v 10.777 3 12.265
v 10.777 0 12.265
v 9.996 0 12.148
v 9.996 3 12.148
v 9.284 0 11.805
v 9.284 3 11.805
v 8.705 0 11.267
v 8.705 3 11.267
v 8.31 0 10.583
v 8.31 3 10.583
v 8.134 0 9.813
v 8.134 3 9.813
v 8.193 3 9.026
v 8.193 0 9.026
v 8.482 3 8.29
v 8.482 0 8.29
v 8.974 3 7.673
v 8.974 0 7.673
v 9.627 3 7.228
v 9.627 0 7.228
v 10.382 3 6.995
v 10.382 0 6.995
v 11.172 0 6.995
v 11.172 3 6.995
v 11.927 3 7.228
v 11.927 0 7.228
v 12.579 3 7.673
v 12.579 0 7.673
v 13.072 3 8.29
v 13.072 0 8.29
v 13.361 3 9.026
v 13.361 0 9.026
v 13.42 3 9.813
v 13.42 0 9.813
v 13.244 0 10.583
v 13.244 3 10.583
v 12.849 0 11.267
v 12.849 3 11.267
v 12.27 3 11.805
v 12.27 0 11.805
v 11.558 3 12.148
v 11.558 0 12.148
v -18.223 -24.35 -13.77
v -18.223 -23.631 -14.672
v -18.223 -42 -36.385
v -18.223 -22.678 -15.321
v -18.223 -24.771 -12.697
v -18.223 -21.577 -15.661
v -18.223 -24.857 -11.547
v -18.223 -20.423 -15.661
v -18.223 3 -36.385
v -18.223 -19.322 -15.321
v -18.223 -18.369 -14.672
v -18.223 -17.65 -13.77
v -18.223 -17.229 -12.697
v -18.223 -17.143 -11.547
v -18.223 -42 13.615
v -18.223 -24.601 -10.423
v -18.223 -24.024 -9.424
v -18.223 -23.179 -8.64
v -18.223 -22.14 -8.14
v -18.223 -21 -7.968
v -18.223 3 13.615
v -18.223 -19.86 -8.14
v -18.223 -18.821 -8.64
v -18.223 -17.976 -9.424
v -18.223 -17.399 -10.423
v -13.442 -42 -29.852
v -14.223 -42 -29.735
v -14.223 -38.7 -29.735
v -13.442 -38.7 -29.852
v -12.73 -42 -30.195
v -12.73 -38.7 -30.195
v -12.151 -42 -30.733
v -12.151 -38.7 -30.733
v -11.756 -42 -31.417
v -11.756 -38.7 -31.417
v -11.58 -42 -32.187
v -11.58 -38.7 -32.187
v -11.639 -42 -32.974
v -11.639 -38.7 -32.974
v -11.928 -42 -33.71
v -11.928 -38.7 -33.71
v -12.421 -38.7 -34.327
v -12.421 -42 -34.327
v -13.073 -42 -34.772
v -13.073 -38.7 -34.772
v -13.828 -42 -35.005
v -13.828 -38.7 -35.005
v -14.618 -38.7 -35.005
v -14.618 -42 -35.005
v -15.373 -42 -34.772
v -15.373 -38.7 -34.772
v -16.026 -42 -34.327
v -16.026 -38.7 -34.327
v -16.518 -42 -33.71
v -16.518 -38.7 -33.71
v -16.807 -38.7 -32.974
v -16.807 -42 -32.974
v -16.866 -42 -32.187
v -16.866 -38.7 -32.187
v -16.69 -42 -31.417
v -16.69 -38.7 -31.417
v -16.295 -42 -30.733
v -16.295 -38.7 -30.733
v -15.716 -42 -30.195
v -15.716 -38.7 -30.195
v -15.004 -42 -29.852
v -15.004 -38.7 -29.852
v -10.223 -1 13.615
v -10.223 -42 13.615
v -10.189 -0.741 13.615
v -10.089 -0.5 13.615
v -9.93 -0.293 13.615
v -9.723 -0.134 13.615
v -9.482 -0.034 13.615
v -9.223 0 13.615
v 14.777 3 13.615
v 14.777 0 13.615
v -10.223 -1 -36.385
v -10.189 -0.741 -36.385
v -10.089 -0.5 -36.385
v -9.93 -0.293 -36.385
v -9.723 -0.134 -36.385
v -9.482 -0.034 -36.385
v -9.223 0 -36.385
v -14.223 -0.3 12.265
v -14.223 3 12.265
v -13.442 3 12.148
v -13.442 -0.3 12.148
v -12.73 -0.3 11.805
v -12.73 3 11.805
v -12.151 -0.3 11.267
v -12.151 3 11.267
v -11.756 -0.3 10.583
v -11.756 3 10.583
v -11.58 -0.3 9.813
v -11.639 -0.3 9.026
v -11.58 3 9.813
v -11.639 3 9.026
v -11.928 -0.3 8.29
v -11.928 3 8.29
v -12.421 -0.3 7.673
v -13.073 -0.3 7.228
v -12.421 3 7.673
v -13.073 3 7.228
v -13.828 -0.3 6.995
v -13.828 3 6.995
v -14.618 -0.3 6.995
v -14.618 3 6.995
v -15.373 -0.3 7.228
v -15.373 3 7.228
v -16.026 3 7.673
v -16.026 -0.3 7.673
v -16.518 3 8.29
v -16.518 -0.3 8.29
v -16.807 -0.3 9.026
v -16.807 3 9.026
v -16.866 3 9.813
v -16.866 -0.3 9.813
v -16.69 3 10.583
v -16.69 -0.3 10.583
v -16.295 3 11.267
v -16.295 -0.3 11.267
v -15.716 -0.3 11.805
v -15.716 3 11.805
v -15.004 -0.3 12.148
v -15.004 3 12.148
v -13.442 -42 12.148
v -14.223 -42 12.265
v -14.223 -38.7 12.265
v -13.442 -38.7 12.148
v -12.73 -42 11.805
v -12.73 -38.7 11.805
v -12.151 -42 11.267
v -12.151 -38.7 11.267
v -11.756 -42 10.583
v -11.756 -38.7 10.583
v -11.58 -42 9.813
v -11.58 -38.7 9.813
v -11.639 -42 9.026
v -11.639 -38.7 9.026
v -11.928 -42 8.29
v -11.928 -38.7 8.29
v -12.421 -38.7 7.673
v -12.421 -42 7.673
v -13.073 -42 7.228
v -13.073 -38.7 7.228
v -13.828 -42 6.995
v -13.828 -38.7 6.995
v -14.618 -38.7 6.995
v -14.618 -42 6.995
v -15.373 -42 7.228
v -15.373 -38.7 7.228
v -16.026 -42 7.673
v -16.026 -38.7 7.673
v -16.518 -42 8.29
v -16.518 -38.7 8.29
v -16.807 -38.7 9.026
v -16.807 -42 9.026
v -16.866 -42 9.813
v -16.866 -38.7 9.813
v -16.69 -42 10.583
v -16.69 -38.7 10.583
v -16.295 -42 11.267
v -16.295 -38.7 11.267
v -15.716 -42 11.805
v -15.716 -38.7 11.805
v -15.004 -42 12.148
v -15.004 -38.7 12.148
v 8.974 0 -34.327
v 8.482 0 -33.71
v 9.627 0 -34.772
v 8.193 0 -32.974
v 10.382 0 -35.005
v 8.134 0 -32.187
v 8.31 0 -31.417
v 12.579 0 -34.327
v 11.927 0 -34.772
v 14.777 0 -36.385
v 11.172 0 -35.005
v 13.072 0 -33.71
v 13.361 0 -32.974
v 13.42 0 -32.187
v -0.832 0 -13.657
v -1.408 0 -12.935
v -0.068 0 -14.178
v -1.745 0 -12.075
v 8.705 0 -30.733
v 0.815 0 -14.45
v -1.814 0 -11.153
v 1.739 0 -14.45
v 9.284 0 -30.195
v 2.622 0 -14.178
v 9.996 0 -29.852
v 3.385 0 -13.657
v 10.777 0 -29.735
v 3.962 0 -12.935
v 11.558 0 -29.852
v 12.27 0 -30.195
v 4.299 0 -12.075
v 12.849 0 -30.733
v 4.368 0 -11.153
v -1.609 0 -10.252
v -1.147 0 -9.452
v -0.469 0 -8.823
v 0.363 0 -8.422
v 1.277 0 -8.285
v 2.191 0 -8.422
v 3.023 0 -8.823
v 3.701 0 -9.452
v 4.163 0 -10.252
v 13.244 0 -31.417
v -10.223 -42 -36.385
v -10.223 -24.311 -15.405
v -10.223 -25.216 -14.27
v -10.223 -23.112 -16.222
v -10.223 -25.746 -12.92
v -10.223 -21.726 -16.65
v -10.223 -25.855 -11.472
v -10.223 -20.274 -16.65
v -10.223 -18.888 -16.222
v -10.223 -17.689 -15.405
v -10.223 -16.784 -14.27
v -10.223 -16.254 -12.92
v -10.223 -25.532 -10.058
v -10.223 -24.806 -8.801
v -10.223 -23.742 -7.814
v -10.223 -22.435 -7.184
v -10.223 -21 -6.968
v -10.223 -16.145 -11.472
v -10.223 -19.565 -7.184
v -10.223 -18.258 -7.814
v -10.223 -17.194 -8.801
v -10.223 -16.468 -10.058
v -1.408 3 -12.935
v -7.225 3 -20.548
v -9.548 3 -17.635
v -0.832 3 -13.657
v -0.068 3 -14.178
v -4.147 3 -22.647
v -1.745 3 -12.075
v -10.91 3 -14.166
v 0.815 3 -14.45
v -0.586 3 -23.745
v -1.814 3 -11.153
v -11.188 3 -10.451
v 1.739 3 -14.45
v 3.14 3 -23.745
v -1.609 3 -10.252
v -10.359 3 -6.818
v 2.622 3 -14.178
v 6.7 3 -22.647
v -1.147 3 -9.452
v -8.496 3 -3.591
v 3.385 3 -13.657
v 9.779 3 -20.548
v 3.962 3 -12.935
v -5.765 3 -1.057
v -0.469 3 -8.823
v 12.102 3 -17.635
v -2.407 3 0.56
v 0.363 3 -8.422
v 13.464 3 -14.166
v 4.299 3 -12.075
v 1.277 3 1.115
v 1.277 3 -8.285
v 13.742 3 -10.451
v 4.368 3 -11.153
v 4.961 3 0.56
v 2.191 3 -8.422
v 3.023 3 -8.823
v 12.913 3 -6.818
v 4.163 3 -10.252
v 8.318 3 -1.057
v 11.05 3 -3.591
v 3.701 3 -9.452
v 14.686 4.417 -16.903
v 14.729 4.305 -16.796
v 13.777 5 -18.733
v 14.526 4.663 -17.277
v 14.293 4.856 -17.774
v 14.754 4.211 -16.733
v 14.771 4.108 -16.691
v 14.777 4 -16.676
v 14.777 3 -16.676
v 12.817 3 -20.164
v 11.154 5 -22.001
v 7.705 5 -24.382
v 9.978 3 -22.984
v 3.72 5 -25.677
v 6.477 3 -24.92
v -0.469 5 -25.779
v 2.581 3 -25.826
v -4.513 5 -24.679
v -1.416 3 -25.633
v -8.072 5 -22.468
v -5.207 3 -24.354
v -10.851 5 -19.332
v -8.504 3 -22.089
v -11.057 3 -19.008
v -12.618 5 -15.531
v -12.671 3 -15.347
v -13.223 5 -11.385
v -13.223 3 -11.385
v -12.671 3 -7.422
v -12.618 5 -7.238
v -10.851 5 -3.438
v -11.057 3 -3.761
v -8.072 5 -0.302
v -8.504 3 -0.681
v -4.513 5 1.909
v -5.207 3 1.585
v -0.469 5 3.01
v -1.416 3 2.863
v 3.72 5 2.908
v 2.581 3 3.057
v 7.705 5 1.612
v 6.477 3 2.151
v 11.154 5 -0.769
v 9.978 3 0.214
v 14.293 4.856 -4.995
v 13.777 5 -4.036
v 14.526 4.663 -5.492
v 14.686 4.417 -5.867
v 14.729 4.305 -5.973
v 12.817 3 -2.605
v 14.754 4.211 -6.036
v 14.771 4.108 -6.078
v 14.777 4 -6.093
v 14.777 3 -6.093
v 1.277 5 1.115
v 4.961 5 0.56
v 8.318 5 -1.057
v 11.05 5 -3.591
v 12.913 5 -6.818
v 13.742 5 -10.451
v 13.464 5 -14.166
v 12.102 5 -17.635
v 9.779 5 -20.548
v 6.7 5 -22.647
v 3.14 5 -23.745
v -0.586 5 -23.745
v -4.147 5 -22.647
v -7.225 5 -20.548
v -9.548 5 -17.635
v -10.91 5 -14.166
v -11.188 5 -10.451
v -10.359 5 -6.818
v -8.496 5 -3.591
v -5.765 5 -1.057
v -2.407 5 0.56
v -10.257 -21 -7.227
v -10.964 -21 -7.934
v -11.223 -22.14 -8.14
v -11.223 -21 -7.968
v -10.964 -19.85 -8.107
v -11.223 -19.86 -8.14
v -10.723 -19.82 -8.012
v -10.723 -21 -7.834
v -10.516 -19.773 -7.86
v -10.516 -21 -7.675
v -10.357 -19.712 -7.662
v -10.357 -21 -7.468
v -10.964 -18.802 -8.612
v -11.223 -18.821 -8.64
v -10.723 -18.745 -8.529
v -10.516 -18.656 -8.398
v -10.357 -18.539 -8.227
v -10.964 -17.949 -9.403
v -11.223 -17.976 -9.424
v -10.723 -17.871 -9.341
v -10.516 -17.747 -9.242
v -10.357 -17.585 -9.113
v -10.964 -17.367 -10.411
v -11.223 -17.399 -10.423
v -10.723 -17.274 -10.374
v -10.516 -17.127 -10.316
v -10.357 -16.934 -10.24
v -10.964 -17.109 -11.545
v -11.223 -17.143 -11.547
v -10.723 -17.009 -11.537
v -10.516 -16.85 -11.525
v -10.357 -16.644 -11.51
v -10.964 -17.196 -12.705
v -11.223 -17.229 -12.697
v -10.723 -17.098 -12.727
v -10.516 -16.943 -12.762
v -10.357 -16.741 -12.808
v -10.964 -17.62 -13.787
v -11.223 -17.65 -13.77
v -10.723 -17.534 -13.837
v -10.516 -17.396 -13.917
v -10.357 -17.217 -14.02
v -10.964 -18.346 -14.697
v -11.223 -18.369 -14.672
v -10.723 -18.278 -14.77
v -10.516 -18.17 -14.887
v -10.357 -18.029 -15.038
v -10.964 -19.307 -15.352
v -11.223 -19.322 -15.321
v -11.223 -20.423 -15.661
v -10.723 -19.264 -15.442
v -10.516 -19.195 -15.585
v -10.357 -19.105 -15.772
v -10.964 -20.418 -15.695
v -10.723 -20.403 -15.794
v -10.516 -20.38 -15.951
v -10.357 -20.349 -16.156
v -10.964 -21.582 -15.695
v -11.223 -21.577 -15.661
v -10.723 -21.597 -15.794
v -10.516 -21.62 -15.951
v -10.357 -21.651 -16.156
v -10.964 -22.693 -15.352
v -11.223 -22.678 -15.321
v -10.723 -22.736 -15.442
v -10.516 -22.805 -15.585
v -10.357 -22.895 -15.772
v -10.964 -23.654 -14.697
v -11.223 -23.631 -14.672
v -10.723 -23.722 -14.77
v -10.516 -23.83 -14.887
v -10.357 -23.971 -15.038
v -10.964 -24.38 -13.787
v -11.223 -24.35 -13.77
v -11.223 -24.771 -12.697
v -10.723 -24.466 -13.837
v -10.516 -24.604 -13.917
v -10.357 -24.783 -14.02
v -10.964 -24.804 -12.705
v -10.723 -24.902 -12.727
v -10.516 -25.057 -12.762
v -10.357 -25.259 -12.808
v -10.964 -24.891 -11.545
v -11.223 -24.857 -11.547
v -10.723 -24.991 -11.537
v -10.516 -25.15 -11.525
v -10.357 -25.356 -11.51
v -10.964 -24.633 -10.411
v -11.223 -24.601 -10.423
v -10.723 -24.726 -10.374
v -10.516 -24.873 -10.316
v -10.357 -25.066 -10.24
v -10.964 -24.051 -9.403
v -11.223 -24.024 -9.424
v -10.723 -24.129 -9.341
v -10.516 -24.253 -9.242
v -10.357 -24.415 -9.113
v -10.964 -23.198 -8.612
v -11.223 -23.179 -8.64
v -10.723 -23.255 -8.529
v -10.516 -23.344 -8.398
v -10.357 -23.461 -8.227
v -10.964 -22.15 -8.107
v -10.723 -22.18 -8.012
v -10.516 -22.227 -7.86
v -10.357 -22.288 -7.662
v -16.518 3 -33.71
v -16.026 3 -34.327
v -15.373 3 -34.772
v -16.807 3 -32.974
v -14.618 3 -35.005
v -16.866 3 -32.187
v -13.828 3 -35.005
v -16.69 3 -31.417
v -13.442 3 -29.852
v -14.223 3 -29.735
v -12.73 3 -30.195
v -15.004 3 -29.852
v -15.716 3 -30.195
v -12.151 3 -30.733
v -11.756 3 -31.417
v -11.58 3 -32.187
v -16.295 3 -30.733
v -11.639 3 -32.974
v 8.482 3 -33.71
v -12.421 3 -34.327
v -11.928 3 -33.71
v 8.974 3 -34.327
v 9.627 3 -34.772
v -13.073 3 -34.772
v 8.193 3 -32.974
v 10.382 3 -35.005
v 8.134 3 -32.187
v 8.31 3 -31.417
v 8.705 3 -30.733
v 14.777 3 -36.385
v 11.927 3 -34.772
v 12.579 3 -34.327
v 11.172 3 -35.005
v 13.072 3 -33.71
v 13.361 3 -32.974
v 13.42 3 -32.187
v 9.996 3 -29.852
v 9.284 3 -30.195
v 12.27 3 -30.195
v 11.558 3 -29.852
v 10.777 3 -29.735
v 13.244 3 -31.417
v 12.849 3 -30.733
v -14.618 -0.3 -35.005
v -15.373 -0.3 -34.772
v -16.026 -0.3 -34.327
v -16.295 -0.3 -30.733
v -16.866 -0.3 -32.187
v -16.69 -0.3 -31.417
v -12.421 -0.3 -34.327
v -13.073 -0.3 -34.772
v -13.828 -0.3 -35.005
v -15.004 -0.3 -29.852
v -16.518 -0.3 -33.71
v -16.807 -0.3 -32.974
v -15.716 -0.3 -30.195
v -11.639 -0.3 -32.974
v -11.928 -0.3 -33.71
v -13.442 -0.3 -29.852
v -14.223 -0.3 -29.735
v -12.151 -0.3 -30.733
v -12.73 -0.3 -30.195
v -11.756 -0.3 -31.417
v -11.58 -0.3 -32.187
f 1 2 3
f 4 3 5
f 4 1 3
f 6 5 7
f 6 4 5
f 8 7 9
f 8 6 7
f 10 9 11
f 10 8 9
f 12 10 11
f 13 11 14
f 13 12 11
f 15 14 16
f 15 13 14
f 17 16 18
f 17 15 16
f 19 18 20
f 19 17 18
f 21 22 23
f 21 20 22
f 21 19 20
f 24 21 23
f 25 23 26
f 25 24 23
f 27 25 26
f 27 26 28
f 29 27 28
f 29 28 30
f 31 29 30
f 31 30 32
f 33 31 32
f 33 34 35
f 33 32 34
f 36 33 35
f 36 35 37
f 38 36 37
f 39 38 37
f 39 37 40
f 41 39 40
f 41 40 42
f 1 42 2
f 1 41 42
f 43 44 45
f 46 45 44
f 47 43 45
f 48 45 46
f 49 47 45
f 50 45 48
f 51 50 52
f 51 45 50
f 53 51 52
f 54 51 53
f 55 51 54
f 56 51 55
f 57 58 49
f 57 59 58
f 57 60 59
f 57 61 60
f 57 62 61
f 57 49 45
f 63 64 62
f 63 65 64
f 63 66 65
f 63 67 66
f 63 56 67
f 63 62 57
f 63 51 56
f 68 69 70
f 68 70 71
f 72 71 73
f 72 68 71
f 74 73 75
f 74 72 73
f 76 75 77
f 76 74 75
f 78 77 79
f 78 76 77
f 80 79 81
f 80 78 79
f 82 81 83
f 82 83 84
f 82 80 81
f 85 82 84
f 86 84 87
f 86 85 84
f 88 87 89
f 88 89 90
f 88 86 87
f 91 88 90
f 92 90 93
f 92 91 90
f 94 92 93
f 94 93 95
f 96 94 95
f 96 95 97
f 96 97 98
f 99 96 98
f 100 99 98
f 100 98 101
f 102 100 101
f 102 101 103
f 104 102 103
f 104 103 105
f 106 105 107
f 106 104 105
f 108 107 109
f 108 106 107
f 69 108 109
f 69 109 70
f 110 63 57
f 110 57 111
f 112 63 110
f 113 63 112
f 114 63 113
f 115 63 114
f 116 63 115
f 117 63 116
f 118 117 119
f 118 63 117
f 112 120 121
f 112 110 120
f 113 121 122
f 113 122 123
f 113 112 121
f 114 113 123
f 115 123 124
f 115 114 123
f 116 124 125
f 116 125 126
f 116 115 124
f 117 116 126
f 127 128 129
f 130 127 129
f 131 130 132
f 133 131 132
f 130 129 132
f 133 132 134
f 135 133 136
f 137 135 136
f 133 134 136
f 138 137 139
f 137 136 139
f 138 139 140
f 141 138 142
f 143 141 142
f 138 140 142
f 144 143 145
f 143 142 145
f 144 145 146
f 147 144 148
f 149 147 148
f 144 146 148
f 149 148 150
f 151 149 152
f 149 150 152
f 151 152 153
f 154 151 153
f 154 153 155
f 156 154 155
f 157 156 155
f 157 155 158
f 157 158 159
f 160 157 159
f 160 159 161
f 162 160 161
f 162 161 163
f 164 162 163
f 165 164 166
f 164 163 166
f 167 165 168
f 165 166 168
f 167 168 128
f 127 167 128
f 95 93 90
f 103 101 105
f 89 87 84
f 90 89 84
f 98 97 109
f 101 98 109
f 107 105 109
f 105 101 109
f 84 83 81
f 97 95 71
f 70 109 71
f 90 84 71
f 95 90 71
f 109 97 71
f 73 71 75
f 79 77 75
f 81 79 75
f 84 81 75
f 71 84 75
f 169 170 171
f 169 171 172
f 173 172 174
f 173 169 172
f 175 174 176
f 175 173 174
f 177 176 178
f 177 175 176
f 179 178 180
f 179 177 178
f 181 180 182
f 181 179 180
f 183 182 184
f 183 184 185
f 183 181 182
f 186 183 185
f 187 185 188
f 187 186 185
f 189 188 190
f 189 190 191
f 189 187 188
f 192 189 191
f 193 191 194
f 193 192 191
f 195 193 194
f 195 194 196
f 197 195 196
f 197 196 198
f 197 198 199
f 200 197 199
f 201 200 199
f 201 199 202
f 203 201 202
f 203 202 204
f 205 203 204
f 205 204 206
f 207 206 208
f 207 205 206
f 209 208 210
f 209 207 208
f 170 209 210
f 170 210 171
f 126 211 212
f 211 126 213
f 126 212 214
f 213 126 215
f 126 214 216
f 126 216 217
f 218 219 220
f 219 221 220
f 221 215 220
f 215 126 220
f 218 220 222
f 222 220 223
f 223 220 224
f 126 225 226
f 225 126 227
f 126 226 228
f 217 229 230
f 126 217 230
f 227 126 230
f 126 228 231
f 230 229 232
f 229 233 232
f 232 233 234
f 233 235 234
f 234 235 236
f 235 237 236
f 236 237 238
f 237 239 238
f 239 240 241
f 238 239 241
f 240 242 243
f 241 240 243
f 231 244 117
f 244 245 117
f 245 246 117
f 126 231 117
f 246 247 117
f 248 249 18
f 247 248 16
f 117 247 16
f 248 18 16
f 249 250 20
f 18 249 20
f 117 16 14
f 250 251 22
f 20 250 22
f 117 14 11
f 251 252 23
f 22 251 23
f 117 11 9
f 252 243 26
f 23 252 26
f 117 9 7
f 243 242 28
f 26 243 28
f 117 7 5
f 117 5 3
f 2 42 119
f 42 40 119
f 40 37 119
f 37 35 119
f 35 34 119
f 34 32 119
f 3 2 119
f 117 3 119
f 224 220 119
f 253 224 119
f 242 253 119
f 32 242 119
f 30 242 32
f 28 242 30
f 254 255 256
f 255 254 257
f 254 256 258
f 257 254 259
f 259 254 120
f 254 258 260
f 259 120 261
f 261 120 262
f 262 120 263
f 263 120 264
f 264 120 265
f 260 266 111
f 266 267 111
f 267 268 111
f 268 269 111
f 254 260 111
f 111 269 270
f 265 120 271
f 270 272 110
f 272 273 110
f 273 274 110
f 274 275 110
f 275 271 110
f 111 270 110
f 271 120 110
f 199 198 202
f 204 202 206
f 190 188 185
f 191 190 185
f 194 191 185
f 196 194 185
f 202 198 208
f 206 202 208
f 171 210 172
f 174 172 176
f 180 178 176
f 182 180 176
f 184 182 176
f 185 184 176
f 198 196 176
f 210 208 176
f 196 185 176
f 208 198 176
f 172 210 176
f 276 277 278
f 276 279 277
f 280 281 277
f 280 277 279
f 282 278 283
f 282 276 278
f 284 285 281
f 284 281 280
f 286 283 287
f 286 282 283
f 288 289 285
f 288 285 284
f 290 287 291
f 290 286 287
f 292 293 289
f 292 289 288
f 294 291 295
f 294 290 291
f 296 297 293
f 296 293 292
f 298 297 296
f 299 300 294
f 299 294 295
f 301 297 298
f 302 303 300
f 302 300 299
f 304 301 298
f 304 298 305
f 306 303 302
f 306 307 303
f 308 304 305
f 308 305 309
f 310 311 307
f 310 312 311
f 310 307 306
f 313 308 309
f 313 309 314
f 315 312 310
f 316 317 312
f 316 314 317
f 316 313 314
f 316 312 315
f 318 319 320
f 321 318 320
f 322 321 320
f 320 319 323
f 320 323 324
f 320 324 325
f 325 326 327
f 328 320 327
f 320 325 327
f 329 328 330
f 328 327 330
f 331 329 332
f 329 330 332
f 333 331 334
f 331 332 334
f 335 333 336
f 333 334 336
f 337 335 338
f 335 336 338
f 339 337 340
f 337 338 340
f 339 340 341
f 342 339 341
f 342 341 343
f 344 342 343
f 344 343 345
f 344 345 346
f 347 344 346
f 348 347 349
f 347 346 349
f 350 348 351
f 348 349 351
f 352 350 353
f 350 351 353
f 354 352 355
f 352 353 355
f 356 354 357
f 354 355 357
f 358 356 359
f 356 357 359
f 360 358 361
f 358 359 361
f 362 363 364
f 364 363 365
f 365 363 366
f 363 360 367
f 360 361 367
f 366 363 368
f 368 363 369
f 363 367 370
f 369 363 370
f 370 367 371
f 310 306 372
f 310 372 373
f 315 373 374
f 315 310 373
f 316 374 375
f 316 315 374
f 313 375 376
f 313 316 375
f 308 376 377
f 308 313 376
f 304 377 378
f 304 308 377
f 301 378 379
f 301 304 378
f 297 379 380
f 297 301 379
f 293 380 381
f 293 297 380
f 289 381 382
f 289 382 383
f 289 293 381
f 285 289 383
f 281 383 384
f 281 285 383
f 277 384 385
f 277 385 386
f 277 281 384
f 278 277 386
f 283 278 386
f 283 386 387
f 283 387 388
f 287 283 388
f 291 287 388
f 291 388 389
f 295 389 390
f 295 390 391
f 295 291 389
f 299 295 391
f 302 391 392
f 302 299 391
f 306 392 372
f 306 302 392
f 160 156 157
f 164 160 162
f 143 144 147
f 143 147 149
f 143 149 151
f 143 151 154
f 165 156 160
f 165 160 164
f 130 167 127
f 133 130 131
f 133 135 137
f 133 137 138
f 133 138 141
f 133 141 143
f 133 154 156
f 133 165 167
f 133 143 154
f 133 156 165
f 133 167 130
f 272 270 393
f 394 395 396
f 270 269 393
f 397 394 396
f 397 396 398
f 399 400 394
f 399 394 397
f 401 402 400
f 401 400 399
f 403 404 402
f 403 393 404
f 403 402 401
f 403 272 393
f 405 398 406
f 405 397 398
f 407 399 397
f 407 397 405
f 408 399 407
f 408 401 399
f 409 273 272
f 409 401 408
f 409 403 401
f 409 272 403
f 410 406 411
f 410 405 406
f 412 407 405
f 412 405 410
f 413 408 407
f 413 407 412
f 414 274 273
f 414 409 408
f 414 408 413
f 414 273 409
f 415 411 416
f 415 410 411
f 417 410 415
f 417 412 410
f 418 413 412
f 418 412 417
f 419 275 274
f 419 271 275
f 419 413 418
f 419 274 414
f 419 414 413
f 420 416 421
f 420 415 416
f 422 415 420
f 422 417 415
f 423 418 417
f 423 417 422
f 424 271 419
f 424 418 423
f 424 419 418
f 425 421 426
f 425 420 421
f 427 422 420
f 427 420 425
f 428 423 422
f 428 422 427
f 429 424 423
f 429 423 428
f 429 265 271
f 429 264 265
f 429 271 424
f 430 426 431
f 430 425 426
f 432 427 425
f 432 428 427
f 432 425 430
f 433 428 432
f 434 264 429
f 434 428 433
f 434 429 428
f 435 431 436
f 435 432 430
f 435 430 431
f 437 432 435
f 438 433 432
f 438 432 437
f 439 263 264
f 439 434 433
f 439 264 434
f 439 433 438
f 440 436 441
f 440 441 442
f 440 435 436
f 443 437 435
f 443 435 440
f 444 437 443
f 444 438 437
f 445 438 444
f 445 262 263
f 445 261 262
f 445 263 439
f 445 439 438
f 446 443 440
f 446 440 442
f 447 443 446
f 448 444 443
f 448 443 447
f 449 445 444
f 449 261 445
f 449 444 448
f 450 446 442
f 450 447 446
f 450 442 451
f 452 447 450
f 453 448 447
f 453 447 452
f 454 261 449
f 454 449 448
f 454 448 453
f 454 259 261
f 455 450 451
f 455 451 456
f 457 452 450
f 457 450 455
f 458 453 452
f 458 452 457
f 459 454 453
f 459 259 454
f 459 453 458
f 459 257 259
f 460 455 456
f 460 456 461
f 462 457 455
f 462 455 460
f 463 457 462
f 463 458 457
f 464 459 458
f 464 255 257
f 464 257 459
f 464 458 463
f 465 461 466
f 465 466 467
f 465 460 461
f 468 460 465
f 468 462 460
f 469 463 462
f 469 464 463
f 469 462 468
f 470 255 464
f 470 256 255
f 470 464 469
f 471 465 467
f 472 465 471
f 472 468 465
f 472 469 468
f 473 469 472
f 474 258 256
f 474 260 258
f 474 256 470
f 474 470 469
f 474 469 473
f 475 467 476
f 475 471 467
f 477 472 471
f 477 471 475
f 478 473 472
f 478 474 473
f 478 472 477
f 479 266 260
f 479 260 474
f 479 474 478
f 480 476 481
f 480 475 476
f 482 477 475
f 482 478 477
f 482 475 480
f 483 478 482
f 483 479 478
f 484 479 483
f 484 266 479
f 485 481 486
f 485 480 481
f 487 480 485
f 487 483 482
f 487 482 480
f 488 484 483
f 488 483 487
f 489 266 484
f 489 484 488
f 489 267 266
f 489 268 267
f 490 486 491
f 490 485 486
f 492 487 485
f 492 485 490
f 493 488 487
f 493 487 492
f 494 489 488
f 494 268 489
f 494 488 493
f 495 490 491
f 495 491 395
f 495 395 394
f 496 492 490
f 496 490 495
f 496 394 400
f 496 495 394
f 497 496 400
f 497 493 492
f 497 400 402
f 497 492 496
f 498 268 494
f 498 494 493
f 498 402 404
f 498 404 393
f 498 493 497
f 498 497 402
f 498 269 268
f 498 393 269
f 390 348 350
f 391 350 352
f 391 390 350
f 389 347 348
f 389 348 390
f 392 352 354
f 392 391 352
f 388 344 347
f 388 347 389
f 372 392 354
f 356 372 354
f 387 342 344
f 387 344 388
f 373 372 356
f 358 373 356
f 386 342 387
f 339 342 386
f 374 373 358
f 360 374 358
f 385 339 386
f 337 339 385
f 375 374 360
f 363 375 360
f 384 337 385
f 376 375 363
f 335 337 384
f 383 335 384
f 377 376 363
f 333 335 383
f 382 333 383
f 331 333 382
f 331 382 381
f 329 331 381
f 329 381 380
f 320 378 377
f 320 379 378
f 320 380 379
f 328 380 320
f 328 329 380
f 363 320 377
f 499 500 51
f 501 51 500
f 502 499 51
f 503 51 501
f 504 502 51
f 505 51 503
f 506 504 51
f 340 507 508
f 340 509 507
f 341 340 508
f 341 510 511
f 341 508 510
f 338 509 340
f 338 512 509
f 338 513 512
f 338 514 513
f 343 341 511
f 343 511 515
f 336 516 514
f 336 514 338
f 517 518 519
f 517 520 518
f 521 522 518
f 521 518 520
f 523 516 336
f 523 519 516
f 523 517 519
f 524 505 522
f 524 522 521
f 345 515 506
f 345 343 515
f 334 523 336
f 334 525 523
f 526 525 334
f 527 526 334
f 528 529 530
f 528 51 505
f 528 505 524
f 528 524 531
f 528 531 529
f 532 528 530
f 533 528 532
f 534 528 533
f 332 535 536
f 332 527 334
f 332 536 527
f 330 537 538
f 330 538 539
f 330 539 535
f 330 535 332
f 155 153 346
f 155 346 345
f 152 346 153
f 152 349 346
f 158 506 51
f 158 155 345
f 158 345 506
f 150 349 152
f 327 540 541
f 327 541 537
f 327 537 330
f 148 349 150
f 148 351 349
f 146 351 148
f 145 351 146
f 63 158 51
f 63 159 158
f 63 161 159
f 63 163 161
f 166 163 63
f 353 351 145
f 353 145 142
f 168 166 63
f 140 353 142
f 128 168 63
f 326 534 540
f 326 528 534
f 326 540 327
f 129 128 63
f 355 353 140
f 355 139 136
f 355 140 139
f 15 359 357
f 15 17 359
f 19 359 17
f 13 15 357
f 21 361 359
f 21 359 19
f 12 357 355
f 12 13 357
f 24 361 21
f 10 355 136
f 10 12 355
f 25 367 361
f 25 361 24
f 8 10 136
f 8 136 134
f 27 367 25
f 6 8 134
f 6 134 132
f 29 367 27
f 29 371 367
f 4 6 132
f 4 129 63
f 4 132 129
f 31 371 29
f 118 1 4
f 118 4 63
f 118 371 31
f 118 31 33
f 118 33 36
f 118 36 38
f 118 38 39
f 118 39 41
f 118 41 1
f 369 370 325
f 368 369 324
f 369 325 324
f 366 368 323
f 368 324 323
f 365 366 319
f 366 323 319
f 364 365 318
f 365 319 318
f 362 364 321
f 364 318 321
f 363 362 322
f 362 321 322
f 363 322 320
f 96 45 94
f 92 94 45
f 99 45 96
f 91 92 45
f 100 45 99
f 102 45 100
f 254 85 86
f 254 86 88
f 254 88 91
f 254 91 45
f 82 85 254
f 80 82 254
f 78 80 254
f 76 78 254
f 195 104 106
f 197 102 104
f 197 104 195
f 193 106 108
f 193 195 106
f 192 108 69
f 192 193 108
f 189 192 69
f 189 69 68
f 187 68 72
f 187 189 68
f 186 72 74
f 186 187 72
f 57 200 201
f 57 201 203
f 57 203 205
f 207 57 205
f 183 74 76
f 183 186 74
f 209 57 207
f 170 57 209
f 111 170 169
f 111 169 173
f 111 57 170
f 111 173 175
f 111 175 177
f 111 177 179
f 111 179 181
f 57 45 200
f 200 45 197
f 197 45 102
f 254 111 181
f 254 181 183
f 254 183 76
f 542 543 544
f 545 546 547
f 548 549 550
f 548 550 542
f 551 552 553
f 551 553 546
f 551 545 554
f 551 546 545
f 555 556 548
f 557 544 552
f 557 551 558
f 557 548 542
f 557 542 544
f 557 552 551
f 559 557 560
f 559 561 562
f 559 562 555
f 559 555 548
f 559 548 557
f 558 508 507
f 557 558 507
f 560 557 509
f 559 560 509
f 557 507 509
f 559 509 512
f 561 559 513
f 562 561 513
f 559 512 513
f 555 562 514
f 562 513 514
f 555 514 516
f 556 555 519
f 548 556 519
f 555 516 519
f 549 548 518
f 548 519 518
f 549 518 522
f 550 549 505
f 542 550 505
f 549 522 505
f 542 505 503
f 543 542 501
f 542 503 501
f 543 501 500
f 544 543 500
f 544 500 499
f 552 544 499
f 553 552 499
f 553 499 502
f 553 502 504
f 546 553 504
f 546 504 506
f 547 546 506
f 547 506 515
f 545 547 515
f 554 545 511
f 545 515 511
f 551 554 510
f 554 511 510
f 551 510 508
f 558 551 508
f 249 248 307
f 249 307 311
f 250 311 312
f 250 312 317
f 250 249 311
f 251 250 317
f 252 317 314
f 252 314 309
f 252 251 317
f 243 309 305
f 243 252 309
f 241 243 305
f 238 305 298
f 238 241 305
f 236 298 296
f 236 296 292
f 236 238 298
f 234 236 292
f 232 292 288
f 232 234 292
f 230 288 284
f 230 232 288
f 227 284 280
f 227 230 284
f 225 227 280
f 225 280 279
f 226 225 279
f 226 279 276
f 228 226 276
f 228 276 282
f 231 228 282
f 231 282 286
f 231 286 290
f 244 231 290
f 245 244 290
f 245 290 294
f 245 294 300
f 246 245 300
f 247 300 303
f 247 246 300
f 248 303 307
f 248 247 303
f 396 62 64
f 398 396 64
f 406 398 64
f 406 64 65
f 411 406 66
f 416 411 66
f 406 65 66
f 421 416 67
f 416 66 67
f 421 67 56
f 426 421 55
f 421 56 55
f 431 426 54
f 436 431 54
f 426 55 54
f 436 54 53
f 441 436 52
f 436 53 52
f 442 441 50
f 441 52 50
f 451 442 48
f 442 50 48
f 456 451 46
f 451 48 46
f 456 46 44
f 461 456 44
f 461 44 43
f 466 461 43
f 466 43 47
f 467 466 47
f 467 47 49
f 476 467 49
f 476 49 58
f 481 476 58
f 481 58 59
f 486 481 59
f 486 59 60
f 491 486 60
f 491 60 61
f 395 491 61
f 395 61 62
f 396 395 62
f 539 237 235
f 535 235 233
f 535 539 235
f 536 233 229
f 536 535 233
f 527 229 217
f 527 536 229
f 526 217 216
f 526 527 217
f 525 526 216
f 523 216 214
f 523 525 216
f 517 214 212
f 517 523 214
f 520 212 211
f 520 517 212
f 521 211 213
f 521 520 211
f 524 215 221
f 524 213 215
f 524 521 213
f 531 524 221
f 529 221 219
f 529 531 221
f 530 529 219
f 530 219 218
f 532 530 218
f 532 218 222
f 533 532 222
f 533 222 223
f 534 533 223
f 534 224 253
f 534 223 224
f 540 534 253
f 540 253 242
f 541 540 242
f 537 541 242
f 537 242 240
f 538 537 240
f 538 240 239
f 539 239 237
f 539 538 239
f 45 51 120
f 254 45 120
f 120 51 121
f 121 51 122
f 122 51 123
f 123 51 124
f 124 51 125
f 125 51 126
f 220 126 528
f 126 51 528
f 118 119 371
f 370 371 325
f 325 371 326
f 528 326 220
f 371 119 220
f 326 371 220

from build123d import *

# Parameters (mm, degrees)
SKETCH1_W           = 25
SKETCH1_H           = 50
SKETCH1_R           = 3.1
BOSS_EXTRUDE1_DEPTH = 3
SKETCH2_W           = 50
SKETCH2_H           = 3
BOSS_EXTRUDE2_DEPTH = 8
SKETCH3_W           = 8
SKETCH3_H           = 50
BOSS_EXTRUDE3_DEPTH = 42
SKETCH4_R           = 2.65
CUT_EXTRUDE1_DEPTH  = 3.3
SKETCH5_R           = 3.868246804
CUT_EXTRUDE2_DEPTH  = 9
FILLET2_R           = 1
SKETCH6_R           = 12.5
BOSS_EXTRUDE4_DEPTH = 2
FILLET3_R           = 1
FILLET4_R           = 1


with BuildPart() as part:
    # Sketch1 → Boss-Extrude1 (new body)
    with BuildSketch(Plane(origin=(0, 0, 0), x_dir=(1, 0, 0), z_dir=(0, 1, 0))):
        with Locations((2.276951673, 11.384758364)):
            Rectangle(SKETCH1_W, SKETCH1_H)
        with Locations(Location((1.276951673, 11.384758364, 0), (0, 0, 270))):
            Circle(SKETCH1_R, mode=Mode.SUBTRACT)
    extrude(amount=BOSS_EXTRUDE1_DEPTH)

    # Sketch2 → Boss-Extrude2 (add)
    with BuildSketch(Plane.ZY.offset(10.223048327)):
        with Locations((-11.384758364, 1.5)):
            Rectangle(SKETCH2_W, SKETCH2_H)
    extrude(amount=BOSS_EXTRUDE2_DEPTH)

    # Sketch3 → Boss-Extrude3 (add)
    with BuildSketch(Plane.XZ):
        with Locations((-14.223048327, -11.384758364)):
            Rectangle(SKETCH3_W, SKETCH3_H)
    extrude(amount=BOSS_EXTRUDE3_DEPTH)

    # Sketch4 → Cut-Extrude1 (cut)
    with BuildSketch(Plane(origin=(0, 3, 0), x_dir=(1, 0, 0), z_dir=(0, 1, 0))):
        with Locations(Location((-14.223048327, 32.384758364, 0), (0, 0, 270))):
            Circle(SKETCH4_R)
        with Locations(Location((-14.223048327, -9.615241636, 0), (0, 0, 270))):
            Circle(SKETCH4_R)
    cut_extrude1 = extrude(amount=-CUT_EXTRUDE1_DEPTH, mode=Mode.SUBTRACT)

    # Mirror1: Cut-Extrude1 across plane
    add(cut_extrude1.mirror(Plane.ZX.offset(-19.5)), mode=Mode.SUBTRACT)

    # Sketch5 → Cut-Extrude2 (cut)
    with BuildSketch(Plane.ZY.offset(18.223048327)):
        with Locations((-11.836279124, -21)):
            Circle(SKETCH5_R)
    extrude(amount=-CUT_EXTRUDE2_DEPTH, mode=Mode.SUBTRACT)

    # Fillet2
    fillet2_edges = [part.edges().sort_by_distance(p)[0] for p in [
        (-10.223048327, -21, -15.704525928),
    ]]
    fillet(fillet2_edges, radius=FILLET2_R)

    # Mirror2: Cut-Extrude1 across plane
    add(cut_extrude1.mirror(Plane.ZY.offset(1.723048327)), mode=Mode.SUBTRACT)

    # Sketch6 → Boss-Extrude4 (add)
    with BuildSketch(Plane(origin=(0, 3, 0), x_dir=(1, 0, 0), z_dir=(0, 1, 0))):
        with BuildLine():
            Line((14.776951673, 6.093255742), (14.776951673, 16.676260986))
            ThreePointArc((14.776951673, 16.676260986), (-13.223048327, 11.384758364), (14.776951673, 6.093255742))
        make_face()
        with Locations(Location((1.276951673, 11.384758364, 0), (0, 0, 270))):
            Circle(SKETCH6_R, mode=Mode.SUBTRACT)
    extrude(amount=BOSS_EXTRUDE4_DEPTH)

    # Fillet3
    fillet3_edges = [part.edges().sort_by_distance(p)[0] for p in [
        (-10.223048327, 0, -11.384758364),
    ]]
    fillet(fillet3_edges, radius=FILLET3_R)

    # Fillet4
    fillet4_edges = [part.edges().sort_by_distance(p)[0] for p in [
        (14.776951673, 5, -11.384758364),
    ]]
    fillet(fillet4_edges, radius=FILLET4_R - 0.0001)  # a hair under: the kernel refuses the full size


solid = part.part
